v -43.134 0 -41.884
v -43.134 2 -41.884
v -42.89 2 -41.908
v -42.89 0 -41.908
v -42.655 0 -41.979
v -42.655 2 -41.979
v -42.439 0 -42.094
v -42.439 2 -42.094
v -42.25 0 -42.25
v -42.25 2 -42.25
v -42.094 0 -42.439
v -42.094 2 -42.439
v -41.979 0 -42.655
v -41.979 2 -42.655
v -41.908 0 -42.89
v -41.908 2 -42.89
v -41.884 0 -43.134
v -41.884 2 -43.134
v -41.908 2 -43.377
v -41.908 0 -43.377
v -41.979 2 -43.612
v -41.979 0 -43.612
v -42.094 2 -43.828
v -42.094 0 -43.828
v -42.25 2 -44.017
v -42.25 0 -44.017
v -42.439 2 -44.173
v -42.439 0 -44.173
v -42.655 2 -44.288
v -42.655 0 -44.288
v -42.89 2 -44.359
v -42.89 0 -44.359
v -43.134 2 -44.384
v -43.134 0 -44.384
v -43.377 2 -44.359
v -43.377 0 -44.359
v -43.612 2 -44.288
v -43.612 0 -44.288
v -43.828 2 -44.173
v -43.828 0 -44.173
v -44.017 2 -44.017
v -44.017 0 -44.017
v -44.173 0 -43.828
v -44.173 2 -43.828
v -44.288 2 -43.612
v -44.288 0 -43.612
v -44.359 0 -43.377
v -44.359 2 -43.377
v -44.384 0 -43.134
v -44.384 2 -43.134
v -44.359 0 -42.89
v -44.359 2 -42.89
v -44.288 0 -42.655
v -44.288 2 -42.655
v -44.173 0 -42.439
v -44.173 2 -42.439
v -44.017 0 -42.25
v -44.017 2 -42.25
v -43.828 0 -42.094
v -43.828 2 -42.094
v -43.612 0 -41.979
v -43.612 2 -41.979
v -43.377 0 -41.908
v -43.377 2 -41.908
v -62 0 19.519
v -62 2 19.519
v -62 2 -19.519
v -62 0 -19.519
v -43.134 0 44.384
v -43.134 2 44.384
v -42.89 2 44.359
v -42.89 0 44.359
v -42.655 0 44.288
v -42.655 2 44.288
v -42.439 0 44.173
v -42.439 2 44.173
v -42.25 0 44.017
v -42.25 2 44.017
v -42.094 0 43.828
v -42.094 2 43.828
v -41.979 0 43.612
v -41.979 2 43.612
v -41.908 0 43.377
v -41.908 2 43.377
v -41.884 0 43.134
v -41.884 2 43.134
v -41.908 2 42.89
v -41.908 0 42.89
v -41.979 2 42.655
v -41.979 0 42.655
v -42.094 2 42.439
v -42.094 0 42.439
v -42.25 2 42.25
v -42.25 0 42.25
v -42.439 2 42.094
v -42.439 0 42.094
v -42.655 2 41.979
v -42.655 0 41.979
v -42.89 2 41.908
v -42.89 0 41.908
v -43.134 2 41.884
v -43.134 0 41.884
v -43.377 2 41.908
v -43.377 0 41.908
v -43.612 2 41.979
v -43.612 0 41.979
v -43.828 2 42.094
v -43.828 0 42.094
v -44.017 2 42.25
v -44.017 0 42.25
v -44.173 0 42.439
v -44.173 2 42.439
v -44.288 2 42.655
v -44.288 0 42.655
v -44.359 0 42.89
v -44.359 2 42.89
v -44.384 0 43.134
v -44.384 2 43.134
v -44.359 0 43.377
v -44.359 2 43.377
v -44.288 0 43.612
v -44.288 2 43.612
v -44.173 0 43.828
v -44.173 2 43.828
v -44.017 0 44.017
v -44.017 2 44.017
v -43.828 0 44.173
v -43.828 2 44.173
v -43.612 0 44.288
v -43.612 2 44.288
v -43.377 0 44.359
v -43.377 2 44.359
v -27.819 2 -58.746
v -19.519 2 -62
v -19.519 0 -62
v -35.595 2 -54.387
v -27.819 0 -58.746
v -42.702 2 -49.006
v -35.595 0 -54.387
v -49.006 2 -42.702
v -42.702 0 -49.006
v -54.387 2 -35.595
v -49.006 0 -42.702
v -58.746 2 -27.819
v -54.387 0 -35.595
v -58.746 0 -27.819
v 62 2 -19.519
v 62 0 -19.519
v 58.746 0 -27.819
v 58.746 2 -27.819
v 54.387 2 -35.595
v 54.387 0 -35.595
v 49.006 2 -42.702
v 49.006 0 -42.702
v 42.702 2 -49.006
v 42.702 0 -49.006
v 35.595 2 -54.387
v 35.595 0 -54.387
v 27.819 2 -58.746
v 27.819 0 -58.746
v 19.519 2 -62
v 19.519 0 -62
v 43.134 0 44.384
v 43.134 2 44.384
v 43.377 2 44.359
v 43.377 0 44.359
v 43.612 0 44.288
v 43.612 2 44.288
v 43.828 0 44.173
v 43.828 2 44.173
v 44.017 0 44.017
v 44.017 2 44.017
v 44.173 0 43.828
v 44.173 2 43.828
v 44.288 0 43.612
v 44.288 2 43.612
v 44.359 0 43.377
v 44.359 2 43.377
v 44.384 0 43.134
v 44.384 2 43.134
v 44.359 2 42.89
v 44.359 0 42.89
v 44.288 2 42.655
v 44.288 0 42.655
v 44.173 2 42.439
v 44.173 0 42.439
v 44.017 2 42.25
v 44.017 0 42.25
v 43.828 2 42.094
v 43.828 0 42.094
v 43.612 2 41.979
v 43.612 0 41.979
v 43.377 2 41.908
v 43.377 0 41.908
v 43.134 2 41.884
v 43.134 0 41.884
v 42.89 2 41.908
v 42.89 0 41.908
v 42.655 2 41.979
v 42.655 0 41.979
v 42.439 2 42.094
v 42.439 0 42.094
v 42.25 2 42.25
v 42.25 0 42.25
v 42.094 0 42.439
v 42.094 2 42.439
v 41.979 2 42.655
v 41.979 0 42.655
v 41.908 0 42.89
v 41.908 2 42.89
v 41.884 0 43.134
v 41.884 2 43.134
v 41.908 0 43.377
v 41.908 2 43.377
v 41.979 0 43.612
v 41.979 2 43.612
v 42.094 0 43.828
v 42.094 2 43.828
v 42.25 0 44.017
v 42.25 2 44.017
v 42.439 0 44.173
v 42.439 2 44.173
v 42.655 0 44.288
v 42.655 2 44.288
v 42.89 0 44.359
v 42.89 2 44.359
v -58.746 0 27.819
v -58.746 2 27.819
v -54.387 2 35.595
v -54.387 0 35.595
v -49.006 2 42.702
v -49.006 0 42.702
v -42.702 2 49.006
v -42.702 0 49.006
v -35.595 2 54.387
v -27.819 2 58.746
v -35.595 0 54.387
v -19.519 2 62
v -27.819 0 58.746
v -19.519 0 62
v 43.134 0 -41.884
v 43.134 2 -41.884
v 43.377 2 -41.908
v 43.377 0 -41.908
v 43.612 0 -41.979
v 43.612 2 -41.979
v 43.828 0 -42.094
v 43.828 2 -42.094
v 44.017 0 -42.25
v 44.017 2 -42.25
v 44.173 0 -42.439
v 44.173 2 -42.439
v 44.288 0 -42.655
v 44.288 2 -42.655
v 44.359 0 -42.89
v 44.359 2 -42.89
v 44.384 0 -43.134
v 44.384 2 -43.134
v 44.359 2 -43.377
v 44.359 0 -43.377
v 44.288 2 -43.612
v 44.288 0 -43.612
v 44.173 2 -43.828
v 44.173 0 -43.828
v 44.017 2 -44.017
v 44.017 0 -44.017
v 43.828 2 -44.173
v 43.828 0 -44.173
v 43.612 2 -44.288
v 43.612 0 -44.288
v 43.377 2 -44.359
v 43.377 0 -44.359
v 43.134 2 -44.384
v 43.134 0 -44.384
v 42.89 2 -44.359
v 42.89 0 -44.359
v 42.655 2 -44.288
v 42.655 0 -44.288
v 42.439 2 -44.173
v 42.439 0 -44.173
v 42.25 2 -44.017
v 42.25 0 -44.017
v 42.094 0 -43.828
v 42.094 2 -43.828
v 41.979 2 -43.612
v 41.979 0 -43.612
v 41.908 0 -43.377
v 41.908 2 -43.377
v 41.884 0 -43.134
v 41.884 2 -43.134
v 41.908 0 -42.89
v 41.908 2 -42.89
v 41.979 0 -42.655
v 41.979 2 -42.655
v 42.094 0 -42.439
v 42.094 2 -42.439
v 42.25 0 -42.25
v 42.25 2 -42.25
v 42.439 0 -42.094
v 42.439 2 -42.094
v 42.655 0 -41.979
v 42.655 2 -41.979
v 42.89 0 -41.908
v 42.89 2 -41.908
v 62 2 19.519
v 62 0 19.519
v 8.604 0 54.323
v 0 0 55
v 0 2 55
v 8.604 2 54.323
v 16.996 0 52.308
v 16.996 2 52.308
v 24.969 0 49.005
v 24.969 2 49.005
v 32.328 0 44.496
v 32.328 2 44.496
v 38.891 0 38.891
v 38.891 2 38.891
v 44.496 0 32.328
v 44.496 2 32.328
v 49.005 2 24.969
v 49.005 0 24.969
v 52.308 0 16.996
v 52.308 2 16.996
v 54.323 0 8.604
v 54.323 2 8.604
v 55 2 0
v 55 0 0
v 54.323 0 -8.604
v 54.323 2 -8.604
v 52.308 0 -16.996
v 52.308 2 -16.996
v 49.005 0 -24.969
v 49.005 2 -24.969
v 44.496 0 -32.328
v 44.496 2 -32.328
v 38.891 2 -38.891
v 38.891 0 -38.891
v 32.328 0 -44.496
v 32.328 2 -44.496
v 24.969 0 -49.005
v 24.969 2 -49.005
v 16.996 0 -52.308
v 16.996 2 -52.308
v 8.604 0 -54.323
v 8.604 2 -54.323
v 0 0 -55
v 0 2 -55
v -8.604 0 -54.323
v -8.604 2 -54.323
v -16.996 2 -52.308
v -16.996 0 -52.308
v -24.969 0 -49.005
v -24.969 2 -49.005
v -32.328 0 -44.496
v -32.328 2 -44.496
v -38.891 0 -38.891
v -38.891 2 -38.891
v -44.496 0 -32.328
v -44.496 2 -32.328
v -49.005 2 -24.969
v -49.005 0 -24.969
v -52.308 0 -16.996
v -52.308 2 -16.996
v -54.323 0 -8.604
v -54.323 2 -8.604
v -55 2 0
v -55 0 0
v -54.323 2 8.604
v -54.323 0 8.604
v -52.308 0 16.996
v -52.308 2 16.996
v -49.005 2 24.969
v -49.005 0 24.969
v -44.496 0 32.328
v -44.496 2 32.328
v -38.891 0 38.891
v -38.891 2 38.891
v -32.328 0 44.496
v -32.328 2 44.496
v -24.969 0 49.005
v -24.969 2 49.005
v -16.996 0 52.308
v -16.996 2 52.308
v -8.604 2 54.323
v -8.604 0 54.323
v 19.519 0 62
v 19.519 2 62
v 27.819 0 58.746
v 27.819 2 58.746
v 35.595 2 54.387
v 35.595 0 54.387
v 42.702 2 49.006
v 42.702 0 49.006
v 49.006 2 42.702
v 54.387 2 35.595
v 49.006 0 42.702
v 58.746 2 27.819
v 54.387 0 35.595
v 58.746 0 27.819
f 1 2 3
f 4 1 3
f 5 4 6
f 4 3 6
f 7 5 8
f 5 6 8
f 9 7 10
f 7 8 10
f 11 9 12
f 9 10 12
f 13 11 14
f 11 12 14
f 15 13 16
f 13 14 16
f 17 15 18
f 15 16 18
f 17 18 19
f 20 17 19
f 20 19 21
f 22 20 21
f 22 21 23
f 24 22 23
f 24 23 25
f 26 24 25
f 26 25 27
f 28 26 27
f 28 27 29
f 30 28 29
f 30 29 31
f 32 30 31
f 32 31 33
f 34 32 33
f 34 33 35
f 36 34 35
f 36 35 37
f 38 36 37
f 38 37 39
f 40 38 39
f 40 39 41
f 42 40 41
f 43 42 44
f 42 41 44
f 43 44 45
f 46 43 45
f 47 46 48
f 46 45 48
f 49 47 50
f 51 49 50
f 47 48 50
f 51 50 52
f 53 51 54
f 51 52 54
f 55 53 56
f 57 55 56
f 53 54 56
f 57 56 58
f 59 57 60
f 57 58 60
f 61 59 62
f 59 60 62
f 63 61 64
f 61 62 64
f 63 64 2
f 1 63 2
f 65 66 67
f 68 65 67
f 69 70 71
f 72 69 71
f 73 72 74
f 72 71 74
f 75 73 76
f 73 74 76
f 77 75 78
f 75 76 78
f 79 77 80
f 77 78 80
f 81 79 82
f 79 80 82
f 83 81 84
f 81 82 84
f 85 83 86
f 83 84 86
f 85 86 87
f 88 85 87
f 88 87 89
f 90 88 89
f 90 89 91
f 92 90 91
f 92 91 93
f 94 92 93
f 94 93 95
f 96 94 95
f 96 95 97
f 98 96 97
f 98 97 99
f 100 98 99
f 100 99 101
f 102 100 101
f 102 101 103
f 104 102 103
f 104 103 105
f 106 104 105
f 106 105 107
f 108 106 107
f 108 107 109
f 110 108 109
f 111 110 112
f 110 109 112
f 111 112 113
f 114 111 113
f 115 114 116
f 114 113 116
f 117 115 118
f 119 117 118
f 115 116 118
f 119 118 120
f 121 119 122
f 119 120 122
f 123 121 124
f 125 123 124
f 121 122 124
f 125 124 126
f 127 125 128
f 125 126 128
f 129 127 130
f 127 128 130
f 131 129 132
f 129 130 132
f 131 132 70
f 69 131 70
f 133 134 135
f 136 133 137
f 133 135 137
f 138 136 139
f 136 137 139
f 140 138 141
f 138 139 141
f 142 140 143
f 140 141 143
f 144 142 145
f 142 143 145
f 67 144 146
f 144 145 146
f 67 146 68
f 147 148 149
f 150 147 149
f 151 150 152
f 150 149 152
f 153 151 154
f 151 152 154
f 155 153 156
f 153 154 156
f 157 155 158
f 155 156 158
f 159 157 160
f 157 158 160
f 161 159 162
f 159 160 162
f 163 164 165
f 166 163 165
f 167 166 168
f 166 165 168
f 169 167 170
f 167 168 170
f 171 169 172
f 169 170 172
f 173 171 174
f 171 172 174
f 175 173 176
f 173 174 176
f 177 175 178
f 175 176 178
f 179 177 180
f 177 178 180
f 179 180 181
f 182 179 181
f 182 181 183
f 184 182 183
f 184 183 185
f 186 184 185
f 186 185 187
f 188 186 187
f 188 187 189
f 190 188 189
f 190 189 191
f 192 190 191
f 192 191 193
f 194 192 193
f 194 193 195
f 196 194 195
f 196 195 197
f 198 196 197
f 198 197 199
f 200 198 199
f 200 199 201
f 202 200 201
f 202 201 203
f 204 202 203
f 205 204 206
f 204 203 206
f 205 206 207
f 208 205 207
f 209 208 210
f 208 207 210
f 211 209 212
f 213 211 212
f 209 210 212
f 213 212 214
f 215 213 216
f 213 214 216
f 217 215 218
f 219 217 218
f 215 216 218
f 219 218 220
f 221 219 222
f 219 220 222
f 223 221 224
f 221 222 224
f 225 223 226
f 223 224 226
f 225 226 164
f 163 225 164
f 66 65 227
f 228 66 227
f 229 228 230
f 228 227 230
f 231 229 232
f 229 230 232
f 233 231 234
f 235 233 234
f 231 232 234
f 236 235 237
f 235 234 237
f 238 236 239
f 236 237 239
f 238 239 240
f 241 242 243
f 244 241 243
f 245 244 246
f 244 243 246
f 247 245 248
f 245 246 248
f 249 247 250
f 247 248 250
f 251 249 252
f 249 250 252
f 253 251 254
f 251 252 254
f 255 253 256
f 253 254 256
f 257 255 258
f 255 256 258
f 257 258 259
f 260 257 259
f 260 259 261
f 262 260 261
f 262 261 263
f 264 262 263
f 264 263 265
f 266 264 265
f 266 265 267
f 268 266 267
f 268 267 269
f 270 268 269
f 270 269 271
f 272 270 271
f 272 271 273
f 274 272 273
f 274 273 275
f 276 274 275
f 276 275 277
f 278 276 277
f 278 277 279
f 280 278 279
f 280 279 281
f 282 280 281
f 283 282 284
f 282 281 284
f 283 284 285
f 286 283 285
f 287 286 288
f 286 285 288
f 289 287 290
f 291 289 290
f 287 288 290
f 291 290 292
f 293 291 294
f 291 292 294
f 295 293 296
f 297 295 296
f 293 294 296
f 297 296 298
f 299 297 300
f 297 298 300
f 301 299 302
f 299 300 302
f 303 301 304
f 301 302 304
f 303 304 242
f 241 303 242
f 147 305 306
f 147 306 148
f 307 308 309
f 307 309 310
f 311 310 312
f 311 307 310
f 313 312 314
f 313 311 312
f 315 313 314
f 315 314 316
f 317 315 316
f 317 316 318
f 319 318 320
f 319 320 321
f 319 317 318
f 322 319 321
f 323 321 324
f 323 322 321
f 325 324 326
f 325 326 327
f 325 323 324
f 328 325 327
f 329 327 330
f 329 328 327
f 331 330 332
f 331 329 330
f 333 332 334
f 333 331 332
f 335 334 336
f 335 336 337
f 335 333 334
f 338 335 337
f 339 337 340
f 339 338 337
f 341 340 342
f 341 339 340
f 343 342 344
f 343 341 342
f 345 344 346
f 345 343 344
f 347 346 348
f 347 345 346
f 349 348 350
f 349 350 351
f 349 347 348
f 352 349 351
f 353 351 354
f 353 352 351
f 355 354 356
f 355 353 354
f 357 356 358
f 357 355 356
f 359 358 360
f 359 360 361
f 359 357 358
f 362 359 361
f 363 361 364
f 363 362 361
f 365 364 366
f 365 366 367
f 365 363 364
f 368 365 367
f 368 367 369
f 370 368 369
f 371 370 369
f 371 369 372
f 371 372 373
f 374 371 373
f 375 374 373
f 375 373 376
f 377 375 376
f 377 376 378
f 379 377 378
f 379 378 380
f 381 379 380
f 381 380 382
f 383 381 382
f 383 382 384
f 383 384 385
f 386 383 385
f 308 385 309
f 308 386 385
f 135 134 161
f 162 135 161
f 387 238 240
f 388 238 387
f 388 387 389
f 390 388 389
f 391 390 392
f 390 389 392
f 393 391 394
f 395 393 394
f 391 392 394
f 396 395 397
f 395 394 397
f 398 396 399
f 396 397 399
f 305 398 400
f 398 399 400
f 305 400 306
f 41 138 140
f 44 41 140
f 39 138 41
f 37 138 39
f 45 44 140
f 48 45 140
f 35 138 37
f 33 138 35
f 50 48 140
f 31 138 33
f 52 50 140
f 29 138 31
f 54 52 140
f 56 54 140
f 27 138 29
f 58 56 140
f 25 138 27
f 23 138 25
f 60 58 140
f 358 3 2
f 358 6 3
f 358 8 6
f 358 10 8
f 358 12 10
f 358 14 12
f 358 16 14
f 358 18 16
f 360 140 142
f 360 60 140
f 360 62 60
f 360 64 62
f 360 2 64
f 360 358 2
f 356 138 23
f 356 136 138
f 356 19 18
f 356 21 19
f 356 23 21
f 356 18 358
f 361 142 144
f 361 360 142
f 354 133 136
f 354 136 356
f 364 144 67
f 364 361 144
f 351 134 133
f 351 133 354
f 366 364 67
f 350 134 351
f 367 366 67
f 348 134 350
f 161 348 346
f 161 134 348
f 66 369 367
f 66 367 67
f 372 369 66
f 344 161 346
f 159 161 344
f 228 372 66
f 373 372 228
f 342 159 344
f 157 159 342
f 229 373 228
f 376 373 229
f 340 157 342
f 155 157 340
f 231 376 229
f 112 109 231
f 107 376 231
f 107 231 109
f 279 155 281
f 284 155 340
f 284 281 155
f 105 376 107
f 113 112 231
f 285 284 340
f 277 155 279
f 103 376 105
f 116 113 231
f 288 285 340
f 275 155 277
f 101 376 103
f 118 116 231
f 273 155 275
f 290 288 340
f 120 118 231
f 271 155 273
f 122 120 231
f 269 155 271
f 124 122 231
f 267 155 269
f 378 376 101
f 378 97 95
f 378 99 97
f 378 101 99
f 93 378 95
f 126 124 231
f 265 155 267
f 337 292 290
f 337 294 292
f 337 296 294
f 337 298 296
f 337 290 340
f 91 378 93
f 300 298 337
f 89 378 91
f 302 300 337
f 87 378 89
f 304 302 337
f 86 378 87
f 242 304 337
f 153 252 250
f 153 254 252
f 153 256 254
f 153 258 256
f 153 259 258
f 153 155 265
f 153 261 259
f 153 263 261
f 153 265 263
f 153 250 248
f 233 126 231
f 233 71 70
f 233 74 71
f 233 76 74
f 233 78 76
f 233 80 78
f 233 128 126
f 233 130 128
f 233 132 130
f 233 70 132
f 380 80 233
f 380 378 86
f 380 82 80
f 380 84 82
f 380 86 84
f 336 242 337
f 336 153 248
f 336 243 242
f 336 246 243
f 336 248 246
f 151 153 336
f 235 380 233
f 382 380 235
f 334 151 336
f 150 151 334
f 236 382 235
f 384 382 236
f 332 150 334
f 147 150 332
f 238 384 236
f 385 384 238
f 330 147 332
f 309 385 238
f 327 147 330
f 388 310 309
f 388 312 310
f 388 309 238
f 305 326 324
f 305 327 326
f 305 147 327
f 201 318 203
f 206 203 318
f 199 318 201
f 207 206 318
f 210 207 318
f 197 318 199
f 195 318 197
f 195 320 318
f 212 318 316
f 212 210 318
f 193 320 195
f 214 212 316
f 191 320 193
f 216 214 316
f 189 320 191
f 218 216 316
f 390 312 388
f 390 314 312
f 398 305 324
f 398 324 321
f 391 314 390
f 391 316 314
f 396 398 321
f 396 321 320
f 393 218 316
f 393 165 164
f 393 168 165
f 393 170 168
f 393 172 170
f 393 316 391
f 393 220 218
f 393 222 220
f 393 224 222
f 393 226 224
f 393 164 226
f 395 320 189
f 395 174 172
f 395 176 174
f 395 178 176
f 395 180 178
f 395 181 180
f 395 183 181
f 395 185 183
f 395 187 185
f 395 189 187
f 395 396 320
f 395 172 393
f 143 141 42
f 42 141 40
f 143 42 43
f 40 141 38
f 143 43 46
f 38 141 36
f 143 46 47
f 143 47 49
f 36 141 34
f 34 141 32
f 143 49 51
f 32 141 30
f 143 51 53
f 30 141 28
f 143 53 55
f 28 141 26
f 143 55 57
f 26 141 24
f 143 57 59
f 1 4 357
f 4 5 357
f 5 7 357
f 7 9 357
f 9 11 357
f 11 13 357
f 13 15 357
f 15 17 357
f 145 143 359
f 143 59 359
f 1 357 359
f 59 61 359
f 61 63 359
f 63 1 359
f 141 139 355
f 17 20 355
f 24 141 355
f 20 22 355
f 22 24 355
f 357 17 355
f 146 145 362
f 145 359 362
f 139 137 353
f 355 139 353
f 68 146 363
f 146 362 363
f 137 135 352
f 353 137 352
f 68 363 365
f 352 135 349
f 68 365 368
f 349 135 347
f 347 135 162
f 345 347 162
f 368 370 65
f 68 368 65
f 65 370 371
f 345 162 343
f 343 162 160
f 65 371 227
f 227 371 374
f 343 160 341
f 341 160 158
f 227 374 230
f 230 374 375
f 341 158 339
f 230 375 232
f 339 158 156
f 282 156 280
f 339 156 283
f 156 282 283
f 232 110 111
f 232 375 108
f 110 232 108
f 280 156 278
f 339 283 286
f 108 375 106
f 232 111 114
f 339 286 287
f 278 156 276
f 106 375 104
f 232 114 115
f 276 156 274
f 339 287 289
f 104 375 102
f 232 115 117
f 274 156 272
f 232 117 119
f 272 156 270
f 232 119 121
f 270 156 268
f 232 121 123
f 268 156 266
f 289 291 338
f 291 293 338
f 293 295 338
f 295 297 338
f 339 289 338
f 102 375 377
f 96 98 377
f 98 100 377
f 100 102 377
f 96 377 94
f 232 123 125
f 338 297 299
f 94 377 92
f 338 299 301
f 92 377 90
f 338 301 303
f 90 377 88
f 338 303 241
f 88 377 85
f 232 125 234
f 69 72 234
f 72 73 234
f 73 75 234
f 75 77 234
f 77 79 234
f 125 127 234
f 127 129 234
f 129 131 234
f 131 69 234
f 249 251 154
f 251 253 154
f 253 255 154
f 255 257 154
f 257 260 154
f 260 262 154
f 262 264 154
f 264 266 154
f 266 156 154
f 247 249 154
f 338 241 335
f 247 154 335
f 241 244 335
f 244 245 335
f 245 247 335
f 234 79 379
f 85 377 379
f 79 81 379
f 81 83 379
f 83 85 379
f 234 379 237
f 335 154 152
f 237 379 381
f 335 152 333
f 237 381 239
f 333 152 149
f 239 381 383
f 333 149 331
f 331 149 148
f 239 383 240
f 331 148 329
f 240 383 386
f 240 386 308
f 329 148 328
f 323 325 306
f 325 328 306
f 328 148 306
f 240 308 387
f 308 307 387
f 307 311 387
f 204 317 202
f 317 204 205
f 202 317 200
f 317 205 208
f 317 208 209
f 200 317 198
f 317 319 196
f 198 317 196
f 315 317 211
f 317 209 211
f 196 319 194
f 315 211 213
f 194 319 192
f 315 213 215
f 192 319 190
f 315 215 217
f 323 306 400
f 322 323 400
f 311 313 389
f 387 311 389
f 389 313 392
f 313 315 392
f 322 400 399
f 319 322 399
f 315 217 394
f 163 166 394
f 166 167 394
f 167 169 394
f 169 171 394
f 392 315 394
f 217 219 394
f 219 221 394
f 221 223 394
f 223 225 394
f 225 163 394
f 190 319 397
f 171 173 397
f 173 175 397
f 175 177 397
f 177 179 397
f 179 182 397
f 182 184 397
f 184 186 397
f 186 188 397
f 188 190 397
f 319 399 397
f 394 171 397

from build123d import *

# Parameters (mm, degrees)
SKETCH_1_R          = 65
SKETCH_1_R_2        = 55
EXTRUDE_1_DEPTH     = 2
SKETCH_3_W          = 168.977595328
SKETCH_3_H          = 144.759308048
SKETCH_3_W_2        = 124
SKETCH_3_H_2        = 124
CUT_EXTRUDE_1_DEPTH = 3
SKETCH_4_R          = 1.25
CUT_EXTRUDE_2_DEPTH = 3


with BuildPart() as part:
    # 草图1 → 凸台-拉伸1 (new body)
    with BuildSketch(Plane(origin=(0, 0, 0), x_dir=(1, 0, 0), z_dir=(0, 1, 0))):
        with Locations(Location((0, 0, 0), (0, 0, 270))):
            Circle(SKETCH_1_R)
        with Locations(Location((0, 0, 0), (0, 0, 270))):
            Circle(SKETCH_1_R_2, mode=Mode.SUBTRACT)
    extrude(amount=EXTRUDE_1_DEPTH)

    # 草图3 → 切除-拉伸1 (cut)
    with BuildSketch(Plane(origin=(0, 2, 0), x_dir=(1, 0, 0), z_dir=(0, 1, 0))):
        Rectangle(SKETCH_3_W, SKETCH_3_H)
        Rectangle(SKETCH_3_W_2, SKETCH_3_H_2, mode=Mode.SUBTRACT)
    extrude(amount=-CUT_EXTRUDE_1_DEPTH, mode=Mode.SUBTRACT)

    # 草图4 → 切除-拉伸2 (cut)
    with BuildSketch(Plane(origin=(0, 2, 0), x_dir=(1, 0, 0), z_dir=(0, 1, 0))):
        with Locations(Location((43.133513652, -43.133513652, 0), (0, 0, 270))):
            Circle(SKETCH_4_R)
        with Locations(Location((-43.133513652, -43.133513652, 0), (0, 0, 270))):
            Circle(SKETCH_4_R)
        with Locations(Location((-43.133513652, 43.133513652, 0), (0, 0, 270))):
            Circle(SKETCH_4_R)
        with Locations(Location((43.133513652, 43.133513652, 0), (0, 0, 270))):
            Circle(SKETCH_4_R)
    extrude(amount=-CUT_EXTRUDE_2_DEPTH, mode=Mode.SUBTRACT)


solid = part.part
